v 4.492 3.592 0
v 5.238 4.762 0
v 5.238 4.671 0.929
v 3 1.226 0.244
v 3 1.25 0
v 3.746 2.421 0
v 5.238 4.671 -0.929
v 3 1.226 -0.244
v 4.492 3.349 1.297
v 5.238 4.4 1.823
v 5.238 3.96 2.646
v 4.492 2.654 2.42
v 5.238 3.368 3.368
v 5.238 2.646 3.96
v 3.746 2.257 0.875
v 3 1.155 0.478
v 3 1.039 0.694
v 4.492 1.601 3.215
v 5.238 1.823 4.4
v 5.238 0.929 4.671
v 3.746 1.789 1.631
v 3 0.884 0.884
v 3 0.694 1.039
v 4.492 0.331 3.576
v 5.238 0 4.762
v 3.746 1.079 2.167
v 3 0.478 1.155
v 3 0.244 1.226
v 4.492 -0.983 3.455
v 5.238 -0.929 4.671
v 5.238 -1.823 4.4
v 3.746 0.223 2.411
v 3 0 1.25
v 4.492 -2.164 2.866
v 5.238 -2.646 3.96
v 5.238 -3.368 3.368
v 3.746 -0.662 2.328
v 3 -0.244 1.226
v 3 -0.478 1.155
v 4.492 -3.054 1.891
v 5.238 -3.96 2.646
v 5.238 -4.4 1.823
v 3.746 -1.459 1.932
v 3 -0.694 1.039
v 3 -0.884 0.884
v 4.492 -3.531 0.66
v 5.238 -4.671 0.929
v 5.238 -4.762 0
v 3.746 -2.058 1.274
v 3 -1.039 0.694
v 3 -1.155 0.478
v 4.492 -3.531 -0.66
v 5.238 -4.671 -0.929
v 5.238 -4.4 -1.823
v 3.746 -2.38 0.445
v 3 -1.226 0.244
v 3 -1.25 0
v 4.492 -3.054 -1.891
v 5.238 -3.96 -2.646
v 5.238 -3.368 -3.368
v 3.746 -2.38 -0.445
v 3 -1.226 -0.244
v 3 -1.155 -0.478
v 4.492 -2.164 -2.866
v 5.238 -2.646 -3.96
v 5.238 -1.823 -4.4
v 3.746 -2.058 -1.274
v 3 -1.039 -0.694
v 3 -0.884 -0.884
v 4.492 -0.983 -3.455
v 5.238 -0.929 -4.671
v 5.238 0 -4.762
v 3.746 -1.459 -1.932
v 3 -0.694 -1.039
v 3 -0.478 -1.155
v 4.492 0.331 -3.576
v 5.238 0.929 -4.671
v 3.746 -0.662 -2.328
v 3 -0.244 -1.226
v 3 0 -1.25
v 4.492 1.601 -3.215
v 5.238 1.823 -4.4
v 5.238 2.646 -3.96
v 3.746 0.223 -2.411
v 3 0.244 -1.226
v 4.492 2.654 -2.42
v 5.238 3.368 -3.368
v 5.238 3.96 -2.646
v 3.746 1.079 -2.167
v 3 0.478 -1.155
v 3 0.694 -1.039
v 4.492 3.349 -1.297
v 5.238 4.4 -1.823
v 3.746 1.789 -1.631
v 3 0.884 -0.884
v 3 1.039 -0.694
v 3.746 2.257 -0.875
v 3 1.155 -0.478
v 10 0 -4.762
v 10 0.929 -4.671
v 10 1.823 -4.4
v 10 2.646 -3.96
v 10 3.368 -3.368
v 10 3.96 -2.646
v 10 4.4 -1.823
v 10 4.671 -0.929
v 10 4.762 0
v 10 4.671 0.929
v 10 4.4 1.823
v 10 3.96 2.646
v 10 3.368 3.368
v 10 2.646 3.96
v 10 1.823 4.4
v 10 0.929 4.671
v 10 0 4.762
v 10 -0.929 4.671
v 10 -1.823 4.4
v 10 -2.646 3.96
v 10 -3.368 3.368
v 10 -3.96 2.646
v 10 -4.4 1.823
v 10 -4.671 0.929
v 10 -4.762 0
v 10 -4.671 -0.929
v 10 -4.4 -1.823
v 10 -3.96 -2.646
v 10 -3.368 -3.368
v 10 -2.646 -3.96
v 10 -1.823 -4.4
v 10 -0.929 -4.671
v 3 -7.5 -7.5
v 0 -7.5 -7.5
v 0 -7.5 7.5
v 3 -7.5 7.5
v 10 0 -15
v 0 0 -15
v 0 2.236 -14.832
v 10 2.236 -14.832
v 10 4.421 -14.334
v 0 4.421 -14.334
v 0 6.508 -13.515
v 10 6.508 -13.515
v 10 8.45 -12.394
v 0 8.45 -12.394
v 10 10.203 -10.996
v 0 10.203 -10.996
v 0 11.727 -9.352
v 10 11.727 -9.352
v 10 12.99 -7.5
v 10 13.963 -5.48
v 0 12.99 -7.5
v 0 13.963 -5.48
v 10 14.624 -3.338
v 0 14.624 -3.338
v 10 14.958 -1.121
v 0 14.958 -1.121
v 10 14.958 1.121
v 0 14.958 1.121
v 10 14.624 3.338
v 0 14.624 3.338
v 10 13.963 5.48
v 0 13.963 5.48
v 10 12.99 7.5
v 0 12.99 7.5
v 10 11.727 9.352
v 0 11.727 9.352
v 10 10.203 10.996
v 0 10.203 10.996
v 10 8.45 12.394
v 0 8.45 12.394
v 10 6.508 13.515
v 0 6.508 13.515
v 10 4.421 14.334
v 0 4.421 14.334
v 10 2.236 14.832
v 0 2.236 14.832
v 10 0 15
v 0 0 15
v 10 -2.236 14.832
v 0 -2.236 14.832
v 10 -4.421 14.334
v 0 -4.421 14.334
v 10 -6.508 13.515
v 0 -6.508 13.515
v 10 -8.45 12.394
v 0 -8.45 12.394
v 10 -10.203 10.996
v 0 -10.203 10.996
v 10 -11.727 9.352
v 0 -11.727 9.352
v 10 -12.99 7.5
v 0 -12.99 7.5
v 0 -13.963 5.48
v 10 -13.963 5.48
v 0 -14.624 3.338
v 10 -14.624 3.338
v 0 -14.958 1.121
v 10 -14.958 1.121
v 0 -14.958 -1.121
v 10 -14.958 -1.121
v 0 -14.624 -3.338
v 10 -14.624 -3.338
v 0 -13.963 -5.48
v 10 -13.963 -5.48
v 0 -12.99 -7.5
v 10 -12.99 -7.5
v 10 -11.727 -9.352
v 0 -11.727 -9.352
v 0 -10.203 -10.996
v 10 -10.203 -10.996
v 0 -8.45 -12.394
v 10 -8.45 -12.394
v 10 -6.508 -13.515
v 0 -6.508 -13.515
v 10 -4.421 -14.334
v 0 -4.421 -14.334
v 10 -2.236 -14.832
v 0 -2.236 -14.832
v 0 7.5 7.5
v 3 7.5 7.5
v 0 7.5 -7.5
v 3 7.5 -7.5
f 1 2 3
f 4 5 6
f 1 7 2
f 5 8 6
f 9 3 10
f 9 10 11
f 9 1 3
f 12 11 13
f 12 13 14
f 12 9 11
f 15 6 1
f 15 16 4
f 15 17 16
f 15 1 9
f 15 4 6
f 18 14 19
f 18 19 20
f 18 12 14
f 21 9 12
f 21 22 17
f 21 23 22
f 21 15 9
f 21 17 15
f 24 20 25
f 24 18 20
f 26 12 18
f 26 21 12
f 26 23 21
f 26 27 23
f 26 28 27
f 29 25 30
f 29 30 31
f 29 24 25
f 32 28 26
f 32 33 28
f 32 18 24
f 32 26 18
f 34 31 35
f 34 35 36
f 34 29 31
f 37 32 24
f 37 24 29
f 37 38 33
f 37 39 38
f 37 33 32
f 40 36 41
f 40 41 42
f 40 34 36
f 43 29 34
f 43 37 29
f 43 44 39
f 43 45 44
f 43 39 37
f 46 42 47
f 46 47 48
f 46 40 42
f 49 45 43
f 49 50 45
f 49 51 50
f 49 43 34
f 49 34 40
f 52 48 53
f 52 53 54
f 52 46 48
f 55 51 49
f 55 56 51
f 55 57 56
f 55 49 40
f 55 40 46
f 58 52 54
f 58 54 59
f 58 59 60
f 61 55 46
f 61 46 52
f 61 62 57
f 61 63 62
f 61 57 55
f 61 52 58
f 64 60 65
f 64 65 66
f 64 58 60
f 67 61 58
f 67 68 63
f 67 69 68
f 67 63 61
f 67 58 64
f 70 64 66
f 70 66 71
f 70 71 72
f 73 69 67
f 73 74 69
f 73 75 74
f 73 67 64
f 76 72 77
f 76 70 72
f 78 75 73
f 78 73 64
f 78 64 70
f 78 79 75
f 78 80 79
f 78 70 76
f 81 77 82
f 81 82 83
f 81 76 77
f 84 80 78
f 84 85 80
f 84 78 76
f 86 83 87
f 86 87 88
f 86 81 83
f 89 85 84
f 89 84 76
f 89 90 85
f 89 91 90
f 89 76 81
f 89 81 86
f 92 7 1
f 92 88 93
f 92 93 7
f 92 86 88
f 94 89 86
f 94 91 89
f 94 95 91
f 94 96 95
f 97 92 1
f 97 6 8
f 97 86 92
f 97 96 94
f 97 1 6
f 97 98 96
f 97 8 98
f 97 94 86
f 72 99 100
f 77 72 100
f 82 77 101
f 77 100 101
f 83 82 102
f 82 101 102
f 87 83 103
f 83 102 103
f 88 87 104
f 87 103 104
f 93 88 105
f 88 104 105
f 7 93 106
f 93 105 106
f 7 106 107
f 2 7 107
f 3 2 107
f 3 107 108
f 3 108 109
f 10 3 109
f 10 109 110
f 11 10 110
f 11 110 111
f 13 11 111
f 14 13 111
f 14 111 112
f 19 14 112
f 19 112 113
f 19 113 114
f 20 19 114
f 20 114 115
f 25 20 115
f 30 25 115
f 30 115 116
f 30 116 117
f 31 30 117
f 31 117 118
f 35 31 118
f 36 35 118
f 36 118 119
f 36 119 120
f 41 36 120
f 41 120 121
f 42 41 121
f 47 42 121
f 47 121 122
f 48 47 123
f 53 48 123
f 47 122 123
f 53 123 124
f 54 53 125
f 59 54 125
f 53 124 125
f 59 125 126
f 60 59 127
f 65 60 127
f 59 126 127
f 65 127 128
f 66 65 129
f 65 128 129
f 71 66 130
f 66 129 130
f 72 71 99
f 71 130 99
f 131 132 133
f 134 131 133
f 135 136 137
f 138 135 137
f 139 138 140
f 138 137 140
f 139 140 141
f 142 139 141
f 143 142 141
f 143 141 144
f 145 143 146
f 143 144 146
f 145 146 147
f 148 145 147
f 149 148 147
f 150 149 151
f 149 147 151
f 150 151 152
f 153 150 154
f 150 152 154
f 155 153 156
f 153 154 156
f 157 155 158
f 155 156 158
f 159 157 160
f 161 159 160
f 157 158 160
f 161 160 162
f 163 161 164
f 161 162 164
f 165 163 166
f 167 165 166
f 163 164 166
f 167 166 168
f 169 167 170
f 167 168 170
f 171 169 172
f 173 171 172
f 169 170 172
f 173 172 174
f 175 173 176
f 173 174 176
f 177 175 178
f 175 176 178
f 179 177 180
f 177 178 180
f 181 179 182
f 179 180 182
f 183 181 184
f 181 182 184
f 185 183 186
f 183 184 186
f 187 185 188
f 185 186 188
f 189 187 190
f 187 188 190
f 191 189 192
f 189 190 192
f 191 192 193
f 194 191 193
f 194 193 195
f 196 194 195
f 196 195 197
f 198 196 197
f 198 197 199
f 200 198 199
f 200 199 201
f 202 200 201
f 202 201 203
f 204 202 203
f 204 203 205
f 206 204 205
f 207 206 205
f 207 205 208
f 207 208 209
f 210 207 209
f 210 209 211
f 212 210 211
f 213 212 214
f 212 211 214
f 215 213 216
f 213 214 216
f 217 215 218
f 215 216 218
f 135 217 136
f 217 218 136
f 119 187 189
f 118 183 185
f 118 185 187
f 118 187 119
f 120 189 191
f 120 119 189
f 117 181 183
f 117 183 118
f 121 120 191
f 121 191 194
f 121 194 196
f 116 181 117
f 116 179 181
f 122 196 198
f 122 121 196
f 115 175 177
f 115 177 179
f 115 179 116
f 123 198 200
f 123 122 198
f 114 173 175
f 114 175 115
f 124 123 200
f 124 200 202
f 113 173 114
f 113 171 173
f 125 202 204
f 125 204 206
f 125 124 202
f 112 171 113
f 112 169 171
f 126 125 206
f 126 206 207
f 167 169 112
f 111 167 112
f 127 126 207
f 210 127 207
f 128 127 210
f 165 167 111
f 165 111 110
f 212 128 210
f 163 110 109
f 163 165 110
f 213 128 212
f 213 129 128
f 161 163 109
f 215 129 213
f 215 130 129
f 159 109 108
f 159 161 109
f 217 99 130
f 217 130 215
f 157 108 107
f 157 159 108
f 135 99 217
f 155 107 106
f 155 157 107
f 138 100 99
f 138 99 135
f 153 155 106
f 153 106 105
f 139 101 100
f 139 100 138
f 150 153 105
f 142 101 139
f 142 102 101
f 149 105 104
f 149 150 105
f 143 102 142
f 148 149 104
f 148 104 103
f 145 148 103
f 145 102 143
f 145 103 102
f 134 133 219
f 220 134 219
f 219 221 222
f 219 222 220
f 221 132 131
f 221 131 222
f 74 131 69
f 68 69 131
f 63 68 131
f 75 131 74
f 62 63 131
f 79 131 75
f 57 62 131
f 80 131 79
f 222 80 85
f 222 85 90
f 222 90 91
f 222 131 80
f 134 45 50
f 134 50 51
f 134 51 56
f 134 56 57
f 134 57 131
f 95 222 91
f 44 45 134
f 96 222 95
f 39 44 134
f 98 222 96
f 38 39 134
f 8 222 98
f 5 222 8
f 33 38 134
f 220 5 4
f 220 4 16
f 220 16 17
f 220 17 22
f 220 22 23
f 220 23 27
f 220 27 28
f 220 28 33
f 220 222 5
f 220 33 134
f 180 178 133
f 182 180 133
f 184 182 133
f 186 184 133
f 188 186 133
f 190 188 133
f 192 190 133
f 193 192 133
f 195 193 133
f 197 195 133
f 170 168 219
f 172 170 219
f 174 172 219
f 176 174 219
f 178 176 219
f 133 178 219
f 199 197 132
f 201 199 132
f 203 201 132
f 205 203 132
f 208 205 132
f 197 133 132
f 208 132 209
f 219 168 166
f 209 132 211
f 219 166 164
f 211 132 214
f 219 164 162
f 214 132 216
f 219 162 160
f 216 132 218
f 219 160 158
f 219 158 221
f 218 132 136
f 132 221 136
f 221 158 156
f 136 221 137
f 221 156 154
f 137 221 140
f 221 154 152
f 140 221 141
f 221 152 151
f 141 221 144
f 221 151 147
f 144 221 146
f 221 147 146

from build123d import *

# Parameters (mm, degrees)
SKETCH1_R           = 15
BOSS_EXTRUDE1_DEPTH = 10
SKETCH2_W           = 15
SKETCH2_H           = 15
CUT_EXTRUDE1_DEPTH  = 3
SKETCH3_R           = 4.7625
CUT_EXTRUDE2_DEPTH  = 4.7625


with BuildPart() as part:
    # Sketch1 → Boss-Extrude1 (new body)
    with BuildSketch(Plane(origin=(0, 0, 0), x_dir=(0, 0, -1), z_dir=(1, 0, 0))):
        Circle(SKETCH1_R)
    extrude(amount=BOSS_EXTRUDE1_DEPTH)

    # Sketch2 → Cut-Extrude1 (cut)
    with BuildSketch(Plane.ZY):
        Rectangle(SKETCH2_W, SKETCH2_H)
    extrude(amount=-CUT_EXTRUDE1_DEPTH, mode=Mode.SUBTRACT)

    # Sketch3 → Cut-Extrude2 (cut)
    with BuildSketch(Plane(origin=(10, 0, 0), x_dir=(0, 0, -1), z_dir=(1, 0, 0))):
        Circle(SKETCH3_R)
    extrude(amount=-CUT_EXTRUDE2_DEPTH, mode=Mode.SUBTRACT)

    # Sketch4 → Cut-Revolve1 (revolve, cut)
    with BuildSketch(Plane.XY):
        Polygon((5.2375, 4.7625), (3, 1.25), (3, 0), (5.2375, 0), align=None)
    revolve(axis=Axis((5.2375, 0, 0), (1, 0, 0)), mode=Mode.SUBTRACT)


solid = part.part
